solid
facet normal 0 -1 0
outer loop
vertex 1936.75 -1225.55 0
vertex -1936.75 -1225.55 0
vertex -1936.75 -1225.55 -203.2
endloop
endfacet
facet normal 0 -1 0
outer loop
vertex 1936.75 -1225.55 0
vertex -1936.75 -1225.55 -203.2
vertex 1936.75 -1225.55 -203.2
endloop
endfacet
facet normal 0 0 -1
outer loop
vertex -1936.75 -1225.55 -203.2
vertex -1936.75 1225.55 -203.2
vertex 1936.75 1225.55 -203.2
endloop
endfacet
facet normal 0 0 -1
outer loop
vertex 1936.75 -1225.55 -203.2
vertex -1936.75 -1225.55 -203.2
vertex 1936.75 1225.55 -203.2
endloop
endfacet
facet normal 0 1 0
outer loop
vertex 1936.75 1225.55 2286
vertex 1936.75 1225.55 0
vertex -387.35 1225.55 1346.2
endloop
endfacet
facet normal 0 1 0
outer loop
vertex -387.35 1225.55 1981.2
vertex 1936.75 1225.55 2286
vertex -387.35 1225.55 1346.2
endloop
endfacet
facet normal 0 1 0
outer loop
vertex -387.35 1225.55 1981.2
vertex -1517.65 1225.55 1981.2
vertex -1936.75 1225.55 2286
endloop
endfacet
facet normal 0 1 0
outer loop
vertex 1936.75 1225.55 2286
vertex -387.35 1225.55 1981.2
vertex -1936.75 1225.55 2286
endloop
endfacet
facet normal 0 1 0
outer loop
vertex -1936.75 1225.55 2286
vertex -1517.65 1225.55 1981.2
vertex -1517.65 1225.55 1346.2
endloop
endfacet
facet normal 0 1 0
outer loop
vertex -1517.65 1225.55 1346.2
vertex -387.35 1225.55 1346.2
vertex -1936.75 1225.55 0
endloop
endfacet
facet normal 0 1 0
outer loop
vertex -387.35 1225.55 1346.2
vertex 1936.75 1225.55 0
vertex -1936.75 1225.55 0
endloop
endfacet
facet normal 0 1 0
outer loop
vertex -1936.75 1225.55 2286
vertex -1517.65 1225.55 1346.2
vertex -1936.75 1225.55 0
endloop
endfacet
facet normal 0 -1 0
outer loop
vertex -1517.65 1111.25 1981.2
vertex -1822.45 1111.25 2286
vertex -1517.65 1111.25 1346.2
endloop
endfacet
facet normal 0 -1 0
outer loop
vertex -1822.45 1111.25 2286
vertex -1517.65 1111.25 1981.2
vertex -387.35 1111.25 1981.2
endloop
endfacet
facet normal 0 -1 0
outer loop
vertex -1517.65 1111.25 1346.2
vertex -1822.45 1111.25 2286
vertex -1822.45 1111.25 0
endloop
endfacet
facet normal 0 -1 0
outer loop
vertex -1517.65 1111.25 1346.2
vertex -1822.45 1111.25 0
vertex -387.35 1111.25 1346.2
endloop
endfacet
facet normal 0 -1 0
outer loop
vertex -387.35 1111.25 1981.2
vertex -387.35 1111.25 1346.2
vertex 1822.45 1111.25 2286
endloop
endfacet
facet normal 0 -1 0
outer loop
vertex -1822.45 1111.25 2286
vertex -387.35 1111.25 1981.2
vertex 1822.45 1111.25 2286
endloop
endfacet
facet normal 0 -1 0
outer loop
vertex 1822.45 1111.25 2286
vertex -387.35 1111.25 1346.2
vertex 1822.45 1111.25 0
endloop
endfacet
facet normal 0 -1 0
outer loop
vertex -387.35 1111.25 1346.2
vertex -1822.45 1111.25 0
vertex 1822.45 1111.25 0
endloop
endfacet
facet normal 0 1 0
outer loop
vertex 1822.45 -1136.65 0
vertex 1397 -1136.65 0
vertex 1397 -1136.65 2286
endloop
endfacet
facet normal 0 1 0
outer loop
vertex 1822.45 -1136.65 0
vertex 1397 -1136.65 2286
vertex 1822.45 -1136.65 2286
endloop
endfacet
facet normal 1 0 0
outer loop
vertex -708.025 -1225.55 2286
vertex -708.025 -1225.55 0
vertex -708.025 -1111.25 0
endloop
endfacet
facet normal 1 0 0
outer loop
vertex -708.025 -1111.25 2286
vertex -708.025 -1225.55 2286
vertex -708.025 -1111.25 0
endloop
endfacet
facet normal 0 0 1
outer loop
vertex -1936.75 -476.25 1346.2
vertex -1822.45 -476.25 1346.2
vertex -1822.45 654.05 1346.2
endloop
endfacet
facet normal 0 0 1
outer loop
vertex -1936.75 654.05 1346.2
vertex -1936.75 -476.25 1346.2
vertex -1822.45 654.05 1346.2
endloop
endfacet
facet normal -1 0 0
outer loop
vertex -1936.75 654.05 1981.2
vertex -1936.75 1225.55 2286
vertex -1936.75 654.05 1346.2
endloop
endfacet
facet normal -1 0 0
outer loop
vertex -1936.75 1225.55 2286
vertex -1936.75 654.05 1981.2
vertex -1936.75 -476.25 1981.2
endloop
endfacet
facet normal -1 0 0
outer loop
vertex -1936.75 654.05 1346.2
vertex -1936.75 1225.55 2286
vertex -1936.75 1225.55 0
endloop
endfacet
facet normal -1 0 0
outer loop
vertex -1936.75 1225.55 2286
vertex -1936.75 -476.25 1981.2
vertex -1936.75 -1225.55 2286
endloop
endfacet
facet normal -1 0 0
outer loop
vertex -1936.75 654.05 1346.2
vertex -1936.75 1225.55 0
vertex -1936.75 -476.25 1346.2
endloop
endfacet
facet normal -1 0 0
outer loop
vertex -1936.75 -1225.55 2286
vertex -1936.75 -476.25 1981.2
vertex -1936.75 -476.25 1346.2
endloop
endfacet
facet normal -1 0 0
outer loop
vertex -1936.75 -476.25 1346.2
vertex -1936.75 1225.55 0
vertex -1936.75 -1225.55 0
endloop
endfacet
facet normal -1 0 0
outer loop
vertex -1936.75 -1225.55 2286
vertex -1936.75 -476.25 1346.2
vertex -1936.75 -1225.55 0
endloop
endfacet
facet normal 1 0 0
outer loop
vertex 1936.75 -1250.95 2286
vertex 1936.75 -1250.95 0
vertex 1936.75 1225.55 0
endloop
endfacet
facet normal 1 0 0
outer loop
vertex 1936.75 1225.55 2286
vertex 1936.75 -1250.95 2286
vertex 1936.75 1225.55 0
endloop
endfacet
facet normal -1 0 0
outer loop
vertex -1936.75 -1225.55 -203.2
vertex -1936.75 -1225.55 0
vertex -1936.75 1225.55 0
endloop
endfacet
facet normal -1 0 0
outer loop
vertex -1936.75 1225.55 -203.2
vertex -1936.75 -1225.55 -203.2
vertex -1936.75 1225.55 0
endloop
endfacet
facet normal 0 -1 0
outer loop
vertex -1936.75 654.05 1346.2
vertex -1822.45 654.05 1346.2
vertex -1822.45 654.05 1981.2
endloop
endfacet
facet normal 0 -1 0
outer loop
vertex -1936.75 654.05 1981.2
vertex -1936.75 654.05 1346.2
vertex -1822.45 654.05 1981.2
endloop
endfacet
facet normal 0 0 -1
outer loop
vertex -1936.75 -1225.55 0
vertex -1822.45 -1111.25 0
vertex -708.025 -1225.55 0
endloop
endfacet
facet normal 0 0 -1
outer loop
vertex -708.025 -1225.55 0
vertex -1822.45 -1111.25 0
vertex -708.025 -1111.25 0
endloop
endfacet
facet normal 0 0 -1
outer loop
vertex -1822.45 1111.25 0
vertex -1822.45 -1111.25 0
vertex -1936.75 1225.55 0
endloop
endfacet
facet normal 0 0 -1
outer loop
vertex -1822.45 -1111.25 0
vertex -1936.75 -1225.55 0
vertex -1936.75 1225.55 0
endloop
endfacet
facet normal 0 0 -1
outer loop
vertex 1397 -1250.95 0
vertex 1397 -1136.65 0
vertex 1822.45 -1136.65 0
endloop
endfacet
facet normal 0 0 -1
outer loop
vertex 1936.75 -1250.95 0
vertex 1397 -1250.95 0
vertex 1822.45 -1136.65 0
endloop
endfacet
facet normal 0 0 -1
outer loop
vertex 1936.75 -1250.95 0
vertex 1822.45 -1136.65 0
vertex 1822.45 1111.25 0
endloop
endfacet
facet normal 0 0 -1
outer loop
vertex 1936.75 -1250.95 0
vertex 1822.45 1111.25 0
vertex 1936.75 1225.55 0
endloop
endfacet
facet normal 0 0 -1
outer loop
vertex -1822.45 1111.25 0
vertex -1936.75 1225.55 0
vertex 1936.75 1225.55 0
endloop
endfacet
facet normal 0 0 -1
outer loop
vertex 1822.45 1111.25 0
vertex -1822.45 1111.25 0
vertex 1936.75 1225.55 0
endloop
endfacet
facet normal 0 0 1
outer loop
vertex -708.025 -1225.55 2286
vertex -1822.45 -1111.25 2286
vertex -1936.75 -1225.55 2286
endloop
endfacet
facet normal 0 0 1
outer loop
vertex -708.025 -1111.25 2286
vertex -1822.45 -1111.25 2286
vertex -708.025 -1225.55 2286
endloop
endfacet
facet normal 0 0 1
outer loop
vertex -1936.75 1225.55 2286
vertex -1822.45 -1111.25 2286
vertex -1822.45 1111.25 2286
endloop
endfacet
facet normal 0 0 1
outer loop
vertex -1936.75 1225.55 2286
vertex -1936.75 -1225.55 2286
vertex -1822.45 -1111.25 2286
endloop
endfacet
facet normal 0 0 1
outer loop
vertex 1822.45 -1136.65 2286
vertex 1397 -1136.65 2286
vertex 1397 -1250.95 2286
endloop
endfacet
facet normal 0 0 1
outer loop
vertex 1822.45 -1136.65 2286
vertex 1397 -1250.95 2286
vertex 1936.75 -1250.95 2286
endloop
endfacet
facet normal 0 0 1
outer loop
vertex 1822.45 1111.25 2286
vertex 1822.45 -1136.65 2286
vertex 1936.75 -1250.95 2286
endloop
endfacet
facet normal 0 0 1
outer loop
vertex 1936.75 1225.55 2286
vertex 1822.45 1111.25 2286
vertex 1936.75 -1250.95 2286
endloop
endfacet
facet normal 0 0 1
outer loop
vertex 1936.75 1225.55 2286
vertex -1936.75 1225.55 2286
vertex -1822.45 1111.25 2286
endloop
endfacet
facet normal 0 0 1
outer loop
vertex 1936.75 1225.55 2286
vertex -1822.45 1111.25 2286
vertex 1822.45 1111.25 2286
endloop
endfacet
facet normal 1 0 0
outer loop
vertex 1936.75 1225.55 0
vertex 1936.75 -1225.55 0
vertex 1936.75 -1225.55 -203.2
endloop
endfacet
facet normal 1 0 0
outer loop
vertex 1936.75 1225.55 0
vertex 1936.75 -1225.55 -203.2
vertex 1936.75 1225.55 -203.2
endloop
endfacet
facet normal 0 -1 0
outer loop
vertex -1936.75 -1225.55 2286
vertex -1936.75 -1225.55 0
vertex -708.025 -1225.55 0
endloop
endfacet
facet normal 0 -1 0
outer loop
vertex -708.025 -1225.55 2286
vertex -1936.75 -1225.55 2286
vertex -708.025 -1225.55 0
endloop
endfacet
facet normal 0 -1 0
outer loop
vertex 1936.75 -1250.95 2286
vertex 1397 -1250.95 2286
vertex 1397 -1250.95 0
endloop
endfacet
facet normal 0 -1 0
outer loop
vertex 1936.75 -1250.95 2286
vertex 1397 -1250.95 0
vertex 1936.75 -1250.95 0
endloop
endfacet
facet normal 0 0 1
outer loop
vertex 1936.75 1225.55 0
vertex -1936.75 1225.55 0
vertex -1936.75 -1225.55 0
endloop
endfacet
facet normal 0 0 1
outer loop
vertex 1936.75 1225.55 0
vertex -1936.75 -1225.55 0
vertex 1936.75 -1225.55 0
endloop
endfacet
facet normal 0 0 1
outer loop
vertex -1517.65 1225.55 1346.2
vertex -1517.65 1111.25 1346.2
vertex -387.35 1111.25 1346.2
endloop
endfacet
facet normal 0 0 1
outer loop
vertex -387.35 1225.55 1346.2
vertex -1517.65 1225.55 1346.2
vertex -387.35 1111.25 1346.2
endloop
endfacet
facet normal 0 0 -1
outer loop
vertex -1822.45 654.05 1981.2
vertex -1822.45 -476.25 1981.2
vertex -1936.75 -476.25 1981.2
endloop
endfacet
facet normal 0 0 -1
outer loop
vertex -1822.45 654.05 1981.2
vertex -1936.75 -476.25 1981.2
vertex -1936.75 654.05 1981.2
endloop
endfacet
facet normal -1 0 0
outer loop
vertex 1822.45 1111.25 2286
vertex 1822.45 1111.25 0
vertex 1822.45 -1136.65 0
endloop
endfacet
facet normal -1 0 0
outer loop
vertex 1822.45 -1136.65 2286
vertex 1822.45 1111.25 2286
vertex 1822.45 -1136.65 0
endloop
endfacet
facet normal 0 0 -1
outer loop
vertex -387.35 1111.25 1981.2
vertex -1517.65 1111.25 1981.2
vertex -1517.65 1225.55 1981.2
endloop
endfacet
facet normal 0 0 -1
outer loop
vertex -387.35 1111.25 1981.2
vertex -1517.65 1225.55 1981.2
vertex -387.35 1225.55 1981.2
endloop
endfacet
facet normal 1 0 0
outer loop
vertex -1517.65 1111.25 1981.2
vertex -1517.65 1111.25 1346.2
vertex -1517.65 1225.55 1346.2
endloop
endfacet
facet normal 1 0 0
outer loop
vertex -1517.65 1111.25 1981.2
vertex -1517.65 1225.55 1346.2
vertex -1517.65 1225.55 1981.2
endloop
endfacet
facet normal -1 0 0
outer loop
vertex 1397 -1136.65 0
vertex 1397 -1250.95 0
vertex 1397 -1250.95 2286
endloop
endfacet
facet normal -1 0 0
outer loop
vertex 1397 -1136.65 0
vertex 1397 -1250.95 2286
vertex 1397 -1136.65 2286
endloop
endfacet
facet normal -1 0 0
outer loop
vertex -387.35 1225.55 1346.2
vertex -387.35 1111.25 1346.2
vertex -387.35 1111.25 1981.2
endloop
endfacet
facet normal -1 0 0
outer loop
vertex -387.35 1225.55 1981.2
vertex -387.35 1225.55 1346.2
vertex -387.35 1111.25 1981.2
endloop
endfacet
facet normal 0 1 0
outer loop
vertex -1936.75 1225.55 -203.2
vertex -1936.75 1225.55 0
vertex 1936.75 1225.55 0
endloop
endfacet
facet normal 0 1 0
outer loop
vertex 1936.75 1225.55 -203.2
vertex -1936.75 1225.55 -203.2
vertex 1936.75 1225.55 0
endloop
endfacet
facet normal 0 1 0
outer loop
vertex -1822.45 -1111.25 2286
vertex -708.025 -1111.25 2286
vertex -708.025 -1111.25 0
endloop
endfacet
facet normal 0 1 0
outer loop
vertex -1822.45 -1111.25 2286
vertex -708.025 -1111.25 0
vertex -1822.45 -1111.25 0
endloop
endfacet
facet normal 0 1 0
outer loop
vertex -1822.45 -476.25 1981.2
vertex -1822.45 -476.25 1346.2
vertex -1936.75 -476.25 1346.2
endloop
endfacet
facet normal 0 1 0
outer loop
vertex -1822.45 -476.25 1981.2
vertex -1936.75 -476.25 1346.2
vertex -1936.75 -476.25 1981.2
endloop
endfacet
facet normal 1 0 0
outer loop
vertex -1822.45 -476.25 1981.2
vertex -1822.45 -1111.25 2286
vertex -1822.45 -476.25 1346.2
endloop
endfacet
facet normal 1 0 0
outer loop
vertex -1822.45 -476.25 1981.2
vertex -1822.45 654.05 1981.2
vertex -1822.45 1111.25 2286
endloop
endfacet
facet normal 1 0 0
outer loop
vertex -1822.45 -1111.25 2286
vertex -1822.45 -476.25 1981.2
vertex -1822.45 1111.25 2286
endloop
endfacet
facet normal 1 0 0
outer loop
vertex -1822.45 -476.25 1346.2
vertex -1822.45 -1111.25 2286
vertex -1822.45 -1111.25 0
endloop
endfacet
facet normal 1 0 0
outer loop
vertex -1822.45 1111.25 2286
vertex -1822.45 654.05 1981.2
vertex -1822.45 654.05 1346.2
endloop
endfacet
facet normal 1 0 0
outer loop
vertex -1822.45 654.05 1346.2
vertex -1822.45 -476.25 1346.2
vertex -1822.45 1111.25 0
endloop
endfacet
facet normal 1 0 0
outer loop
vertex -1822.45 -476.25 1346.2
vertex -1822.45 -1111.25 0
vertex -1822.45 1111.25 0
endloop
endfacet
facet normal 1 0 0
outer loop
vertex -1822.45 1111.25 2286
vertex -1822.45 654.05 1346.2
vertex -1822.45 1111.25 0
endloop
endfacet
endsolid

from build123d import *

# Parameters (mm, degrees)
F0_W     = 3873.5
F0_H     = 2451.1
F1_DEPTH = 203.2
F2_W     = 114.3
F2_H     = 114.3
F2_W_2   = 1114.425
F2_H_2   = 2222.5
F2_W_3   = 3644.9
F2_H_3   = 2247.9
F2_W_4   = 425.45
F3_DEPTH = 2286
F4_W     = 1130.3
F4_H     = 635
F5_DEPTH = 114.301
F6_W     = 1130.3
F6_H     = 635
F7_DEPTH = 114.301


with BuildPart() as f1:
    # F0 (on Top) → F1 (new body)
    with BuildSketch(Plane.XY):
        Rectangle(F0_W, F0_H)
    extrude(amount=-F1_DEPTH)


with BuildPart() as f3:
    # F2 (on Top) → F3 (new body)
    with BuildSketch(Plane.XY):
        with Locations((-1879.6, -1168.4)):
            Rectangle(F2_W, F2_H)
        with Locations((-1265.2375, -1168.4)):
            Rectangle(F2_W_2, F2_H)
        with Locations((-1879.6, 0)):
            Rectangle(F2_W, F2_H_2)
        with Locations((-1879.6, 1168.4)):
            Rectangle(F2_W, F2_H)
        with Locations((0, 1168.4)):
            Rectangle(F2_W_3, F2_H)
        with Locations((1879.6, 1168.4)):
            Rectangle(F2_W, F2_H)
        with Locations((1879.6, -12.7)):
            Rectangle(F2_W, F2_H_3)
        with Locations((1879.6, -1193.8)):
            Rectangle(F2_W, F2_H)
        with Locations((1609.725, -1193.8)):
            Rectangle(F2_W_4, F2_H)
    extrude(amount=F3_DEPTH)

    # F4 (on face) → F5 (cut, through all)
    with BuildSketch(Plane.XZ.offset(-1111.25)):
        with Locations((-952.5, 1663.7)):
            Rectangle(F4_W, F4_H)
    extrude(amount=-F5_DEPTH, mode=Mode.SUBTRACT)

    # F6 (on face) → F7 (cut, through all)
    with BuildSketch(Plane.YZ.offset(-1822.45)):
        with Locations((88.9, 1663.7)):
            Rectangle(F6_W, F6_H)
    extrude(amount=-F7_DEPTH, mode=Mode.SUBTRACT)


solid = Compound([f1.part, f3.part])
